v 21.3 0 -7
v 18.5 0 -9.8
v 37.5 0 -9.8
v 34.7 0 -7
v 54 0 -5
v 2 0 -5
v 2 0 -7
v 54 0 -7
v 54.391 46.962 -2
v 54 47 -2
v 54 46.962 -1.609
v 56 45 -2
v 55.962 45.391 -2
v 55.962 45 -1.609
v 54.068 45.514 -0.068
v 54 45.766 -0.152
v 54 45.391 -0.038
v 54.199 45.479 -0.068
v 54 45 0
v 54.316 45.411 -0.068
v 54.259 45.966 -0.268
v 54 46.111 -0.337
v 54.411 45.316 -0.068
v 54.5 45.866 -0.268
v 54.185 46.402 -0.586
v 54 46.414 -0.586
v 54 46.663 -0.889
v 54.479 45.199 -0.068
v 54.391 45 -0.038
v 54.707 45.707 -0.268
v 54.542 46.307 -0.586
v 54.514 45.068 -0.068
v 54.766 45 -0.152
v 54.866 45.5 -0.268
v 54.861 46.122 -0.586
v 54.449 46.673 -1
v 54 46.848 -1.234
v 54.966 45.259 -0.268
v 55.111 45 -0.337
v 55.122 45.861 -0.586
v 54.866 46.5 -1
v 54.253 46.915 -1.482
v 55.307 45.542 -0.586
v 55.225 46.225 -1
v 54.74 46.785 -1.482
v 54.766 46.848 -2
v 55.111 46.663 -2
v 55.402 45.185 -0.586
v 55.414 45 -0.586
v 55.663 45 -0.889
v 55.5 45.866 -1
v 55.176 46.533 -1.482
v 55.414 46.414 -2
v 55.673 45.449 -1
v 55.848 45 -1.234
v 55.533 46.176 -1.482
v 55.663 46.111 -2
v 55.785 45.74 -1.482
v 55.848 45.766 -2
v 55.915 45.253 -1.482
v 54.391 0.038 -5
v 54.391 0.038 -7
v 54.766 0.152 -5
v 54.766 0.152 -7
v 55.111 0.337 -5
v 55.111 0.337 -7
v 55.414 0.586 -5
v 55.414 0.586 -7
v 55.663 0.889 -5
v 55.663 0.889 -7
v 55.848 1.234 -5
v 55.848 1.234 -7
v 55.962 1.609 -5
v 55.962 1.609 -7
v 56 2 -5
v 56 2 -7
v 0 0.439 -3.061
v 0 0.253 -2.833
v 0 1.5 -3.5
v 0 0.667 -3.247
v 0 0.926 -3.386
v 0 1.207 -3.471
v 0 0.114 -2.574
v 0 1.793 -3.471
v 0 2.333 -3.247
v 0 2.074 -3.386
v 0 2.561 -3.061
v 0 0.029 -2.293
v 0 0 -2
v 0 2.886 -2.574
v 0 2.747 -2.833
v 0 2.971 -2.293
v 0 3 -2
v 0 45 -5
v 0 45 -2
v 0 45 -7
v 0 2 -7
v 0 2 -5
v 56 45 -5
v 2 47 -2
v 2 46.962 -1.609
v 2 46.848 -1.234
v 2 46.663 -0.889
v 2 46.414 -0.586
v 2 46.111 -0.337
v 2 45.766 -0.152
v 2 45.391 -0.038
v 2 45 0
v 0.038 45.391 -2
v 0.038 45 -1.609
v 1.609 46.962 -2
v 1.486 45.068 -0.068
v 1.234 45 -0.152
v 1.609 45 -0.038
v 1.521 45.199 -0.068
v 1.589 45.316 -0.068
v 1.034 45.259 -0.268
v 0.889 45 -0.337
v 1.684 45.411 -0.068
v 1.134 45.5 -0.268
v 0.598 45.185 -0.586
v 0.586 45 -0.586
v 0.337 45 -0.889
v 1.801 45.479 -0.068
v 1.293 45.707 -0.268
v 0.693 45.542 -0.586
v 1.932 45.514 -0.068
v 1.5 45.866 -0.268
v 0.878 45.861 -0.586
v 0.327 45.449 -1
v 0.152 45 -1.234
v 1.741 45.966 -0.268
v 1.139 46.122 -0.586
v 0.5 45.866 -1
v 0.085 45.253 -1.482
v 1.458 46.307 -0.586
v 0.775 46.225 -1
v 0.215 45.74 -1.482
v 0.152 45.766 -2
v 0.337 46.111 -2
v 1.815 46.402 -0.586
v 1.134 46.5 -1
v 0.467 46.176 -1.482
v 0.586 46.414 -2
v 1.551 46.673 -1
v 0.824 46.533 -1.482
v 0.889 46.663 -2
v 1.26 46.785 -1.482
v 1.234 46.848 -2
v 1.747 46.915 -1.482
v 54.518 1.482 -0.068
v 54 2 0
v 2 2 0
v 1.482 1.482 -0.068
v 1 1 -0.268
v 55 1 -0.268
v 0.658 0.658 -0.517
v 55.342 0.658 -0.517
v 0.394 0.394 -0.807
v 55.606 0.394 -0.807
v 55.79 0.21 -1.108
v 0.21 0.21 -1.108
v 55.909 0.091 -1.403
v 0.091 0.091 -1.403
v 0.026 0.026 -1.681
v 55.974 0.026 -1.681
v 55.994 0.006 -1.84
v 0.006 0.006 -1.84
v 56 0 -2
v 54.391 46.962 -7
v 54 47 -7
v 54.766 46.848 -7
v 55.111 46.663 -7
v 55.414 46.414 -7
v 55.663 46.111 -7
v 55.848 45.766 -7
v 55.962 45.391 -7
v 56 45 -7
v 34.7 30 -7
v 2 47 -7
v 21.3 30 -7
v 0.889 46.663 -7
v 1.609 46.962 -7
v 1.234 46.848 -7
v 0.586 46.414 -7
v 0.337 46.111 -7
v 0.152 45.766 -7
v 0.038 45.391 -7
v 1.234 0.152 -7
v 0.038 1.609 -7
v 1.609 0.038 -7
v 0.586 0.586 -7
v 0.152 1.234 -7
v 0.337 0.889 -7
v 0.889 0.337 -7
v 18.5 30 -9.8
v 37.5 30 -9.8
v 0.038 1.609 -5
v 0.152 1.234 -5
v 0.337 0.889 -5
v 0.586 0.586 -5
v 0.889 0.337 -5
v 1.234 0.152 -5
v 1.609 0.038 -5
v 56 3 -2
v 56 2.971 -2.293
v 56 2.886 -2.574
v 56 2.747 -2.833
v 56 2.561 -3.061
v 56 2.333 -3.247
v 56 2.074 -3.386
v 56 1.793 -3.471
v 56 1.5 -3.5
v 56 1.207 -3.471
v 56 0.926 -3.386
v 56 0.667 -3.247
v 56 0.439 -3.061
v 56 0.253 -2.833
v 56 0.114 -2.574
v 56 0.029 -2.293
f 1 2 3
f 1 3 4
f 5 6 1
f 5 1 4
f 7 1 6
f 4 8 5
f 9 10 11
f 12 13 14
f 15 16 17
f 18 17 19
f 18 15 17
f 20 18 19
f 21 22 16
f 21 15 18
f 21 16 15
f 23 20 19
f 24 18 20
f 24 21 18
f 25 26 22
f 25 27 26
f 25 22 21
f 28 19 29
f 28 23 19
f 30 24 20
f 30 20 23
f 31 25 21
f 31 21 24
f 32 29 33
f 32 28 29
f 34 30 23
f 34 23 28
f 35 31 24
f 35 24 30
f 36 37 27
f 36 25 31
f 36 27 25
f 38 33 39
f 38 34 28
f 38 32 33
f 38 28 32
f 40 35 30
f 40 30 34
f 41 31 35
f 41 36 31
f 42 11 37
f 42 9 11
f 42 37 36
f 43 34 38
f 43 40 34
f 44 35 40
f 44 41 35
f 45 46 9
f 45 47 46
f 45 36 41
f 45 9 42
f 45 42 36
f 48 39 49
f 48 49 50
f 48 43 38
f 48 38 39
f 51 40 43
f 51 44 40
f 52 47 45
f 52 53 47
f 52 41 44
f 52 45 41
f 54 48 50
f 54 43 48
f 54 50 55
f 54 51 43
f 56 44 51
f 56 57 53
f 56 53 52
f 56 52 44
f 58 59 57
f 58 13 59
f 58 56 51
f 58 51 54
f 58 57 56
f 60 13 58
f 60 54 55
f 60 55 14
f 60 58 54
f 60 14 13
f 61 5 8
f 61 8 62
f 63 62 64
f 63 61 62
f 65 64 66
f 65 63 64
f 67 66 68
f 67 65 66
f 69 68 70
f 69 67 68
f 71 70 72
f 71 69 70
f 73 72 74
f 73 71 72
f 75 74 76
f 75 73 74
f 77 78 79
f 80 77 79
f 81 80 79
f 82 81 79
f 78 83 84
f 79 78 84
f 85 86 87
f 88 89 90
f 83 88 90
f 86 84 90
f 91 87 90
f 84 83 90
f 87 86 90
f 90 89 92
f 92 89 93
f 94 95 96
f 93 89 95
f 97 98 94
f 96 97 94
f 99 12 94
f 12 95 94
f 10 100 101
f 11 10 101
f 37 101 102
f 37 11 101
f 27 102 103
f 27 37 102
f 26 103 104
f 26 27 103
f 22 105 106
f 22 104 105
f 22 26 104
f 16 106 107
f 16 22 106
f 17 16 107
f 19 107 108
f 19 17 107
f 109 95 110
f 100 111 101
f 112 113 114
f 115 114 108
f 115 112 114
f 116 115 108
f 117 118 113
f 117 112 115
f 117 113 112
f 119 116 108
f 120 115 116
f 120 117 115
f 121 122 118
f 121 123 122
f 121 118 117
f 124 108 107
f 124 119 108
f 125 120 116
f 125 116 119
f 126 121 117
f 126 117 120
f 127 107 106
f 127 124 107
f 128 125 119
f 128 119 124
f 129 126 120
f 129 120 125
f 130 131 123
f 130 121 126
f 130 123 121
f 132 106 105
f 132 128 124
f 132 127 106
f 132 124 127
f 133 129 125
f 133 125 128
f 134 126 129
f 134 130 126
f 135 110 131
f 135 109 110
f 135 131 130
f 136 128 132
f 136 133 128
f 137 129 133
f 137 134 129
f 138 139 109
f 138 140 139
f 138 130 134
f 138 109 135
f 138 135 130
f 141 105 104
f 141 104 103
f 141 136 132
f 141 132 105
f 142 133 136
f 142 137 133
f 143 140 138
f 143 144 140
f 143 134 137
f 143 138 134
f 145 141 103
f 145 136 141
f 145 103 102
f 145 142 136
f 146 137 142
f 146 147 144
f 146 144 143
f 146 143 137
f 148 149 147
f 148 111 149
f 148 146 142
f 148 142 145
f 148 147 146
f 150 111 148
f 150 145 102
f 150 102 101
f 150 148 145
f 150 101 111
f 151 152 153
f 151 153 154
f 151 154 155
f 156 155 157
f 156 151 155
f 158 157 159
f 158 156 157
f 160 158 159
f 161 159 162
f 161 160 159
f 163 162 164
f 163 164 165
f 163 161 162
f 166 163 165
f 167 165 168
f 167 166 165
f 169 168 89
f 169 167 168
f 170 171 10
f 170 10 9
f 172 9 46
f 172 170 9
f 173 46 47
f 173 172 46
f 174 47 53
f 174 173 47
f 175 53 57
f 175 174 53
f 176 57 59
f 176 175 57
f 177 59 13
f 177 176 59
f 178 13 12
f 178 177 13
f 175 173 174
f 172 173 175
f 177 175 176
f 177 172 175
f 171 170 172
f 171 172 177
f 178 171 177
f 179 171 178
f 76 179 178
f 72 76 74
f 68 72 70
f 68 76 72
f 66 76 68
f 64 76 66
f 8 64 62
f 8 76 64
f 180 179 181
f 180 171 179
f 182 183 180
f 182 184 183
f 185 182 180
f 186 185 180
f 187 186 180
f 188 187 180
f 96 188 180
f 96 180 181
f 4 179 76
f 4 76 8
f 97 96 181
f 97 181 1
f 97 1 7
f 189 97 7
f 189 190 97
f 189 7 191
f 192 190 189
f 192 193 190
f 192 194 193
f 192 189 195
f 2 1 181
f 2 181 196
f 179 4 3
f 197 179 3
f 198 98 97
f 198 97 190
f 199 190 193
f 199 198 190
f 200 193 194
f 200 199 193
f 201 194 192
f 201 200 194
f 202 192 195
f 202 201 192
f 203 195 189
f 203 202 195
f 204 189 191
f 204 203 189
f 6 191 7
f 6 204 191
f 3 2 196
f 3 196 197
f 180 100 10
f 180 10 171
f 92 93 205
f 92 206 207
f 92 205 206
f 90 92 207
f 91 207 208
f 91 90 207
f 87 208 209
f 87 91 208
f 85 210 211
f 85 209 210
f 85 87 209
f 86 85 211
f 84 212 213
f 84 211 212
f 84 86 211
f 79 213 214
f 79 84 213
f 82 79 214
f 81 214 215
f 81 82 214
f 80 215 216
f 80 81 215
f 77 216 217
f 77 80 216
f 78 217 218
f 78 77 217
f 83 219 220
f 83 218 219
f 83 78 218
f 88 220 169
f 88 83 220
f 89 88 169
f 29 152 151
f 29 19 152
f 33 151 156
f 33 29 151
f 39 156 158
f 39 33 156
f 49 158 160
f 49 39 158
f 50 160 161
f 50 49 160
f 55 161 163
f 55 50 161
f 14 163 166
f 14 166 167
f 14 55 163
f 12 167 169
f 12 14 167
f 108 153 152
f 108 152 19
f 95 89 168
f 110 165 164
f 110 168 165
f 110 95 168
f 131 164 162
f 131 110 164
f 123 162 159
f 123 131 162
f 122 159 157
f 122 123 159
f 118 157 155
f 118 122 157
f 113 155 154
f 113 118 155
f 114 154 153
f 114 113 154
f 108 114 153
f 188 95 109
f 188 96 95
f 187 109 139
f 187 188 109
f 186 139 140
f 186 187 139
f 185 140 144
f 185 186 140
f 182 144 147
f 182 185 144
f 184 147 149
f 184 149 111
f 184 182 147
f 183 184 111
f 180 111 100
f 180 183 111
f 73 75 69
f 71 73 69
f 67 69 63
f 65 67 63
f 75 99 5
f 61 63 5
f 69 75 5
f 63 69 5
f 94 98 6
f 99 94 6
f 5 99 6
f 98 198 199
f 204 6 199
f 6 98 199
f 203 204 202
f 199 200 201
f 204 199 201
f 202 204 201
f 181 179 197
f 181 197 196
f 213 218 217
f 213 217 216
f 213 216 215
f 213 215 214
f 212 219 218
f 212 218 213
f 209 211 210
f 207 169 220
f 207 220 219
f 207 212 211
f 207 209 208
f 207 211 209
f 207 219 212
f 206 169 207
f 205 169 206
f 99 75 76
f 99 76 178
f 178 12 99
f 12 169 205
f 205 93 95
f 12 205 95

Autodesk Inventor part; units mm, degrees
ref_plane "YZ Plane" through (0, 0, 0) normal (1, 0, 0) x (0, 1, 0)
ref_plane "XZ Plane" through (0, 0, 0) normal (0, 1, 0) x (-1, 0, 0)
ref_plane "XY Plane" through (0, 0, 0) normal (0, 0, 1) x (1, 0, 0)
sketch "Sketch1" plane through (0, 0, 0) normal (1, 0, 0) x (0, 1, 0)
  line L0 (0, 0) -> (0, -2)
  line L1 (0, -2) -> (45, -2)
  line L2 (45, -2) -> (45, -5)
  line L3 (45, -5) -> (0, -5)
  line L4 (0, 0) -> (47, 0)
  line L5 (47, 0) -> (47, -7)
  line L6 (47, -7) -> (0, -7)
  line L7 (0, -7) -> (0, -5)
  circle A0 centre (1.5, -2) radius 1.5
  point P0 (3, -2)
  point P1 (32, -2)
  point P2 (32, -5)
  dimension "d0" = 2
  dimension "d1" = 45
  dimension "d2" = 3
  dimension "d3" = 47
  dimension "d4" = 7
  dimension "d5" = 3
  dimension "d6" = 1.5
extrude "Extrusion1" add sketch "Sketch1" along normal blind 56
sketch "Sketch3" plane through (0, 0, 0) normal (0, 1, 0) x (-1, 0, 0)
  line L0 (0, -7) -> (-56, -7) projected
  line L1 (-34.7, -7) -> (-21.3, -7)
  line L2 (-21.3, -7) -> (-18.5, -9.8)
  line L3 (-18.5, -9.8) -> (-37.5, -9.8)
  line L4 (-34.7, -7) -> (-37.5, -9.8)
  line L5 (-56, -5) -> (-56, -7) projected
  point P0 (0, 0)
  point P1 (-28, -7)
  point P2 (-56, -6)
  point P3 (-21.3, -7)
  dimension "d10" = 135
  dimension "d11" = 135
  dimension "d12" = 2.8
  dimension "d13" = 28
  dimension "d14" = 19
extrude "Extrusion2" add sketch "Sketch3" along normal blind 30
fillet "Rundung1" radius 2 8 edges at (56, 47, -3.5) (56, 0, -6) (0, 47, -3.5) (0, 0, -6) (0, 23.5, 0) (28, 47, 0) (56, 23.5, 0) (28, 0, 0)
properties part number "belt_clip"
